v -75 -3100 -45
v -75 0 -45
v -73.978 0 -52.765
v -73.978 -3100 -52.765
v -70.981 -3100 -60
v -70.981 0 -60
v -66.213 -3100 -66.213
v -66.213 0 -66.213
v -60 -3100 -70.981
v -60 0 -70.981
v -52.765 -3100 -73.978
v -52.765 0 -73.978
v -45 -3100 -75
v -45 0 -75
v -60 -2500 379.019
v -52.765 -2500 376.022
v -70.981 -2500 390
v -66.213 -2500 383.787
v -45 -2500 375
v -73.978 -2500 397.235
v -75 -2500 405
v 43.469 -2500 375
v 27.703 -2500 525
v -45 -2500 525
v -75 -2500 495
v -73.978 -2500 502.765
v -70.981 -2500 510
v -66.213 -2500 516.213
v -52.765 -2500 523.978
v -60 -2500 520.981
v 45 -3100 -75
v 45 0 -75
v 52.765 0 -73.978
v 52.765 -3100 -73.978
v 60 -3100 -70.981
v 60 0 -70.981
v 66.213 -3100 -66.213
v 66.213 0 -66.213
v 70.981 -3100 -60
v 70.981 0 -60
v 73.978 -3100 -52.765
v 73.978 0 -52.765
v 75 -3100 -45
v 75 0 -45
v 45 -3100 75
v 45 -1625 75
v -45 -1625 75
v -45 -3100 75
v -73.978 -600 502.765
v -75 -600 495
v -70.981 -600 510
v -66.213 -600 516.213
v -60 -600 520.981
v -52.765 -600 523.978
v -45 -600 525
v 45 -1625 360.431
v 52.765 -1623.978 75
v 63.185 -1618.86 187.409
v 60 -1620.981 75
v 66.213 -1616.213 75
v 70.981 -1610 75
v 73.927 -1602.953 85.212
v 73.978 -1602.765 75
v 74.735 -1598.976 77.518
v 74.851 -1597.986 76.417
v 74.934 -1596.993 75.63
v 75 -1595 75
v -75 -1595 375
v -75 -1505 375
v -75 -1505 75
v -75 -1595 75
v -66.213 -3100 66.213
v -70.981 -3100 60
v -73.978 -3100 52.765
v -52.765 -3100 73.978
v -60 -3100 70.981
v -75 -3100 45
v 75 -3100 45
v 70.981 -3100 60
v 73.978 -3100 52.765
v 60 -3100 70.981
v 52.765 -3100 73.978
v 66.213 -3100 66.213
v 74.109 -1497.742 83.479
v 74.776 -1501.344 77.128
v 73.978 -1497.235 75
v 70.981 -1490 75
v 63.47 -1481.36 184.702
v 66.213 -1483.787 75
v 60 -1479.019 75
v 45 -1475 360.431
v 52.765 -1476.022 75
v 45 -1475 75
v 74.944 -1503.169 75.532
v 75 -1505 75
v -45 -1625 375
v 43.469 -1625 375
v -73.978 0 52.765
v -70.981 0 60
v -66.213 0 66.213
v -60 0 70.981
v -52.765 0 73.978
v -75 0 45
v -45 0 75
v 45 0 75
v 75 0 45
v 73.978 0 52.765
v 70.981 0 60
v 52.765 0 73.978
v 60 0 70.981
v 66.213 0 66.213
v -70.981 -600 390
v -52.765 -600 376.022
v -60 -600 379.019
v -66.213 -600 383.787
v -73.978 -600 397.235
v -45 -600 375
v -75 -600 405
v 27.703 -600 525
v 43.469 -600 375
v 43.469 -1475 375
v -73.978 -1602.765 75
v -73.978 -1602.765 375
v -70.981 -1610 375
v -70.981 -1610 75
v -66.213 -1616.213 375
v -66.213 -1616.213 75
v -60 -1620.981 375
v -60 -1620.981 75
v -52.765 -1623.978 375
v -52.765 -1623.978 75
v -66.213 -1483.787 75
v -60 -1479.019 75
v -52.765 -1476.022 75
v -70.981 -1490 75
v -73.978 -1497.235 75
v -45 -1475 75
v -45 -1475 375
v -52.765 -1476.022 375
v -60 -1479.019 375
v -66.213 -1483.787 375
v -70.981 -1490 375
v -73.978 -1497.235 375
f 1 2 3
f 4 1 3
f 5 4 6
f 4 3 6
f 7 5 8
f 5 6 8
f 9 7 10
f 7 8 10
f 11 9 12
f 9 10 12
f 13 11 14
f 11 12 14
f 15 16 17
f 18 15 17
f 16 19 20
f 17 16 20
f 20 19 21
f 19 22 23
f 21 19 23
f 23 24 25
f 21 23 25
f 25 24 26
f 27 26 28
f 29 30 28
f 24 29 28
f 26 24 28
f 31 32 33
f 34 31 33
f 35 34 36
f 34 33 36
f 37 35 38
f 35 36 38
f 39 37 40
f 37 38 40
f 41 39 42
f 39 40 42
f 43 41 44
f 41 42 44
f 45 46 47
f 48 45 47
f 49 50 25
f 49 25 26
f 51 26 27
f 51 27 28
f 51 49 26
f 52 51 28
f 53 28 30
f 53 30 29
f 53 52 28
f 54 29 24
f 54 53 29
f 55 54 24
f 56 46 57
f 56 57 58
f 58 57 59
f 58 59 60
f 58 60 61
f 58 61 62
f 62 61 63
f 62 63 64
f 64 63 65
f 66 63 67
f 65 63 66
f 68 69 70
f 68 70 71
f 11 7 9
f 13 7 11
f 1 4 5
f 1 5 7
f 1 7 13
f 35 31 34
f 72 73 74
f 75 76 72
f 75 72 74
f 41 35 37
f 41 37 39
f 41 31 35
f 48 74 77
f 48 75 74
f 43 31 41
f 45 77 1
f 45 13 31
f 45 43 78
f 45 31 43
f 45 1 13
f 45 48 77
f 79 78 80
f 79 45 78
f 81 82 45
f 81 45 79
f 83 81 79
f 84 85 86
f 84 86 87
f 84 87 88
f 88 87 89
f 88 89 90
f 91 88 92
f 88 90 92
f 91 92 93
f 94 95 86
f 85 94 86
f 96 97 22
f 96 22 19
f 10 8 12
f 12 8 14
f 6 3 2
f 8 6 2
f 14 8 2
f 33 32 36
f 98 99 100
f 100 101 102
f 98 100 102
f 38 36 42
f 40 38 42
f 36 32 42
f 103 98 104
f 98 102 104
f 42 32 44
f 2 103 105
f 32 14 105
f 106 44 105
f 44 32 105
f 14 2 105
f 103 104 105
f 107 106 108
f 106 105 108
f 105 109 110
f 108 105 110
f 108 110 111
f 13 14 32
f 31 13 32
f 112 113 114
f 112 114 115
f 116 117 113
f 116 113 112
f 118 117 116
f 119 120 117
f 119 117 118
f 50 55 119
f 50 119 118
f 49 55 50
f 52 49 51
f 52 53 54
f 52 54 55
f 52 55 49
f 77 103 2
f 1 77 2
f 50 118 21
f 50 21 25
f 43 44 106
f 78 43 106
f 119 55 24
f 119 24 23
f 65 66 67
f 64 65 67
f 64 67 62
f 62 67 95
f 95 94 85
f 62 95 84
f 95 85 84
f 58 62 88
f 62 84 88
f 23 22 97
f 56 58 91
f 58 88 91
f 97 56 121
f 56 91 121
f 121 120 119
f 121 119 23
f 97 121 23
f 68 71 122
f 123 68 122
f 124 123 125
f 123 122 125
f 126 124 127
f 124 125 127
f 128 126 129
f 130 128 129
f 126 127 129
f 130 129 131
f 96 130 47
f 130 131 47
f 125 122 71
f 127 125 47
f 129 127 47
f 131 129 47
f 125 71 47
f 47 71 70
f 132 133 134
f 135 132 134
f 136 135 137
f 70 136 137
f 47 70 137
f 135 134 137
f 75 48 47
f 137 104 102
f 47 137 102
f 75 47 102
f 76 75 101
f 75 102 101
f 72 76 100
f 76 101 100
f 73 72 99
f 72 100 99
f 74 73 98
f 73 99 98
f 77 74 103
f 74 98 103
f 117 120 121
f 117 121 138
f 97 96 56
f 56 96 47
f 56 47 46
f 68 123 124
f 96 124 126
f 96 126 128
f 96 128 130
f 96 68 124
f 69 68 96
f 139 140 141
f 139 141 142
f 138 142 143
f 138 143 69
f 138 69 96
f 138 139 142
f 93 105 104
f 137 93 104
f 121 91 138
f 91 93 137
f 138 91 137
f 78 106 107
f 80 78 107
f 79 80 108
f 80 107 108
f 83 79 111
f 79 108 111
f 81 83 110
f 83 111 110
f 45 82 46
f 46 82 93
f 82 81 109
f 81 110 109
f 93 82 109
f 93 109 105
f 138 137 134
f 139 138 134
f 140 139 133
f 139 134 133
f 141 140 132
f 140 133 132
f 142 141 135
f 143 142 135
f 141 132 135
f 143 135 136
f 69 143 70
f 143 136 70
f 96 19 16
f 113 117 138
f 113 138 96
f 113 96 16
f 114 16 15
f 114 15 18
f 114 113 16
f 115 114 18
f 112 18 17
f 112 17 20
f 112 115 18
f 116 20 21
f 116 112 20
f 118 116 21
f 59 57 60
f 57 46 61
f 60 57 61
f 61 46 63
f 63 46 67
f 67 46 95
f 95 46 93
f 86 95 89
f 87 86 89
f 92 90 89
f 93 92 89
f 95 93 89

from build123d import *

# Parameters (mm, degrees)
F1_DEPTH = 3100
F3_START = -600
F3_DEPTH = 1900
F5_DEPTH = 300
F7_DEPTH = 3500


with BuildPart() as f1:
    # F0 (on Front) → F1 (new body)
    with BuildSketch(Plane.XZ):
        with BuildLine():
            ThreePointArc((75, 45), (66.2132034356, 66.2132034356), (45, 75))
            Line((45, 75), (-45, 75))
            ThreePointArc((-45, 75), (-66.2132034356, 66.2132034356), (-75, 45))
            Line((-75, 45), (-75, -45))
            ThreePointArc((-75, -45), (-66.2132034356, -66.2132034356), (-45, -75))
            Line((-45, -75), (45, -75))
            ThreePointArc((45, -75), (66.2132034356, -66.2132034356), (75, -45))
            Line((75, -45), (75, 45))
        make_face()
    extrude(amount=F1_DEPTH)



with BuildPart() as f3:
    # F2 (on face) → F3 (new body)
    with BuildSketch(Plane(origin=(0, 0, 0), x_dir=(-1, 0, 0), z_dir=(0, 1, 0)).offset(F3_START)):
        with BuildLine():
            ThreePointArc((75, 495), (66.2132034356, 516.2132034356), (45, 525))
            Line((45, 525), (-45, 525))
            ThreePointArc((-45, 525), (-66.2132034356, 516.2132034356), (-75, 495))
            Line((-75, 495), (-75, 405))
            ThreePointArc((-75, 405), (-66.2132034356, 383.7867965644), (-45, 375))
            Line((-45, 375), (45, 375))
            ThreePointArc((45, 375), (66.2132034356, 383.7867965644), (75, 405))
            Line((75, 405), (75, 495))
        make_face()
    extrude(amount=-F3_DEPTH)


with BuildPart() as f1_1:
    add(f1.part)

    add(f3.part)  # F5 merges F3
    # F4 (on face) → F5 (join, through all)
    with BuildSketch(Plane.XY.offset(75)):
        with BuildLine():
            ThreePointArc((-75, -1595), (-66.2132034356, -1616.2132034356), (-45, -1625))
            Line((-45, -1625), (45, -1625))
            ThreePointArc((45, -1625), (66.2132034356, -1616.2132034356), (75, -1595))
            Line((75, -1595), (75, -1505))
            ThreePointArc((75, -1505), (66.2132034356, -1483.7867965644), (45, -1475))
            Line((45, -1475), (-45, -1475))
            ThreePointArc((-45, -1475), (-66.2132034356, -1483.7867965644), (-75, -1505))
            Line((-75, -1505), (-75, -1595))
        make_face()
    extrude(amount=F5_DEPTH)

    # F6 (on face) → F7 (cut)
    with BuildSketch(Plane(origin=(0, 0, 0), x_dir=(-1, 0, 0), z_dir=(0, 1, 0))):
        Polygon((-75, 75), (-27.7030941304, 525), (-204.0130716196, 525), (-204.0130716196, 75), align=None)
    extrude(amount=-F7_DEPTH, mode=Mode.SUBTRACT)


solid = f1_1.part
